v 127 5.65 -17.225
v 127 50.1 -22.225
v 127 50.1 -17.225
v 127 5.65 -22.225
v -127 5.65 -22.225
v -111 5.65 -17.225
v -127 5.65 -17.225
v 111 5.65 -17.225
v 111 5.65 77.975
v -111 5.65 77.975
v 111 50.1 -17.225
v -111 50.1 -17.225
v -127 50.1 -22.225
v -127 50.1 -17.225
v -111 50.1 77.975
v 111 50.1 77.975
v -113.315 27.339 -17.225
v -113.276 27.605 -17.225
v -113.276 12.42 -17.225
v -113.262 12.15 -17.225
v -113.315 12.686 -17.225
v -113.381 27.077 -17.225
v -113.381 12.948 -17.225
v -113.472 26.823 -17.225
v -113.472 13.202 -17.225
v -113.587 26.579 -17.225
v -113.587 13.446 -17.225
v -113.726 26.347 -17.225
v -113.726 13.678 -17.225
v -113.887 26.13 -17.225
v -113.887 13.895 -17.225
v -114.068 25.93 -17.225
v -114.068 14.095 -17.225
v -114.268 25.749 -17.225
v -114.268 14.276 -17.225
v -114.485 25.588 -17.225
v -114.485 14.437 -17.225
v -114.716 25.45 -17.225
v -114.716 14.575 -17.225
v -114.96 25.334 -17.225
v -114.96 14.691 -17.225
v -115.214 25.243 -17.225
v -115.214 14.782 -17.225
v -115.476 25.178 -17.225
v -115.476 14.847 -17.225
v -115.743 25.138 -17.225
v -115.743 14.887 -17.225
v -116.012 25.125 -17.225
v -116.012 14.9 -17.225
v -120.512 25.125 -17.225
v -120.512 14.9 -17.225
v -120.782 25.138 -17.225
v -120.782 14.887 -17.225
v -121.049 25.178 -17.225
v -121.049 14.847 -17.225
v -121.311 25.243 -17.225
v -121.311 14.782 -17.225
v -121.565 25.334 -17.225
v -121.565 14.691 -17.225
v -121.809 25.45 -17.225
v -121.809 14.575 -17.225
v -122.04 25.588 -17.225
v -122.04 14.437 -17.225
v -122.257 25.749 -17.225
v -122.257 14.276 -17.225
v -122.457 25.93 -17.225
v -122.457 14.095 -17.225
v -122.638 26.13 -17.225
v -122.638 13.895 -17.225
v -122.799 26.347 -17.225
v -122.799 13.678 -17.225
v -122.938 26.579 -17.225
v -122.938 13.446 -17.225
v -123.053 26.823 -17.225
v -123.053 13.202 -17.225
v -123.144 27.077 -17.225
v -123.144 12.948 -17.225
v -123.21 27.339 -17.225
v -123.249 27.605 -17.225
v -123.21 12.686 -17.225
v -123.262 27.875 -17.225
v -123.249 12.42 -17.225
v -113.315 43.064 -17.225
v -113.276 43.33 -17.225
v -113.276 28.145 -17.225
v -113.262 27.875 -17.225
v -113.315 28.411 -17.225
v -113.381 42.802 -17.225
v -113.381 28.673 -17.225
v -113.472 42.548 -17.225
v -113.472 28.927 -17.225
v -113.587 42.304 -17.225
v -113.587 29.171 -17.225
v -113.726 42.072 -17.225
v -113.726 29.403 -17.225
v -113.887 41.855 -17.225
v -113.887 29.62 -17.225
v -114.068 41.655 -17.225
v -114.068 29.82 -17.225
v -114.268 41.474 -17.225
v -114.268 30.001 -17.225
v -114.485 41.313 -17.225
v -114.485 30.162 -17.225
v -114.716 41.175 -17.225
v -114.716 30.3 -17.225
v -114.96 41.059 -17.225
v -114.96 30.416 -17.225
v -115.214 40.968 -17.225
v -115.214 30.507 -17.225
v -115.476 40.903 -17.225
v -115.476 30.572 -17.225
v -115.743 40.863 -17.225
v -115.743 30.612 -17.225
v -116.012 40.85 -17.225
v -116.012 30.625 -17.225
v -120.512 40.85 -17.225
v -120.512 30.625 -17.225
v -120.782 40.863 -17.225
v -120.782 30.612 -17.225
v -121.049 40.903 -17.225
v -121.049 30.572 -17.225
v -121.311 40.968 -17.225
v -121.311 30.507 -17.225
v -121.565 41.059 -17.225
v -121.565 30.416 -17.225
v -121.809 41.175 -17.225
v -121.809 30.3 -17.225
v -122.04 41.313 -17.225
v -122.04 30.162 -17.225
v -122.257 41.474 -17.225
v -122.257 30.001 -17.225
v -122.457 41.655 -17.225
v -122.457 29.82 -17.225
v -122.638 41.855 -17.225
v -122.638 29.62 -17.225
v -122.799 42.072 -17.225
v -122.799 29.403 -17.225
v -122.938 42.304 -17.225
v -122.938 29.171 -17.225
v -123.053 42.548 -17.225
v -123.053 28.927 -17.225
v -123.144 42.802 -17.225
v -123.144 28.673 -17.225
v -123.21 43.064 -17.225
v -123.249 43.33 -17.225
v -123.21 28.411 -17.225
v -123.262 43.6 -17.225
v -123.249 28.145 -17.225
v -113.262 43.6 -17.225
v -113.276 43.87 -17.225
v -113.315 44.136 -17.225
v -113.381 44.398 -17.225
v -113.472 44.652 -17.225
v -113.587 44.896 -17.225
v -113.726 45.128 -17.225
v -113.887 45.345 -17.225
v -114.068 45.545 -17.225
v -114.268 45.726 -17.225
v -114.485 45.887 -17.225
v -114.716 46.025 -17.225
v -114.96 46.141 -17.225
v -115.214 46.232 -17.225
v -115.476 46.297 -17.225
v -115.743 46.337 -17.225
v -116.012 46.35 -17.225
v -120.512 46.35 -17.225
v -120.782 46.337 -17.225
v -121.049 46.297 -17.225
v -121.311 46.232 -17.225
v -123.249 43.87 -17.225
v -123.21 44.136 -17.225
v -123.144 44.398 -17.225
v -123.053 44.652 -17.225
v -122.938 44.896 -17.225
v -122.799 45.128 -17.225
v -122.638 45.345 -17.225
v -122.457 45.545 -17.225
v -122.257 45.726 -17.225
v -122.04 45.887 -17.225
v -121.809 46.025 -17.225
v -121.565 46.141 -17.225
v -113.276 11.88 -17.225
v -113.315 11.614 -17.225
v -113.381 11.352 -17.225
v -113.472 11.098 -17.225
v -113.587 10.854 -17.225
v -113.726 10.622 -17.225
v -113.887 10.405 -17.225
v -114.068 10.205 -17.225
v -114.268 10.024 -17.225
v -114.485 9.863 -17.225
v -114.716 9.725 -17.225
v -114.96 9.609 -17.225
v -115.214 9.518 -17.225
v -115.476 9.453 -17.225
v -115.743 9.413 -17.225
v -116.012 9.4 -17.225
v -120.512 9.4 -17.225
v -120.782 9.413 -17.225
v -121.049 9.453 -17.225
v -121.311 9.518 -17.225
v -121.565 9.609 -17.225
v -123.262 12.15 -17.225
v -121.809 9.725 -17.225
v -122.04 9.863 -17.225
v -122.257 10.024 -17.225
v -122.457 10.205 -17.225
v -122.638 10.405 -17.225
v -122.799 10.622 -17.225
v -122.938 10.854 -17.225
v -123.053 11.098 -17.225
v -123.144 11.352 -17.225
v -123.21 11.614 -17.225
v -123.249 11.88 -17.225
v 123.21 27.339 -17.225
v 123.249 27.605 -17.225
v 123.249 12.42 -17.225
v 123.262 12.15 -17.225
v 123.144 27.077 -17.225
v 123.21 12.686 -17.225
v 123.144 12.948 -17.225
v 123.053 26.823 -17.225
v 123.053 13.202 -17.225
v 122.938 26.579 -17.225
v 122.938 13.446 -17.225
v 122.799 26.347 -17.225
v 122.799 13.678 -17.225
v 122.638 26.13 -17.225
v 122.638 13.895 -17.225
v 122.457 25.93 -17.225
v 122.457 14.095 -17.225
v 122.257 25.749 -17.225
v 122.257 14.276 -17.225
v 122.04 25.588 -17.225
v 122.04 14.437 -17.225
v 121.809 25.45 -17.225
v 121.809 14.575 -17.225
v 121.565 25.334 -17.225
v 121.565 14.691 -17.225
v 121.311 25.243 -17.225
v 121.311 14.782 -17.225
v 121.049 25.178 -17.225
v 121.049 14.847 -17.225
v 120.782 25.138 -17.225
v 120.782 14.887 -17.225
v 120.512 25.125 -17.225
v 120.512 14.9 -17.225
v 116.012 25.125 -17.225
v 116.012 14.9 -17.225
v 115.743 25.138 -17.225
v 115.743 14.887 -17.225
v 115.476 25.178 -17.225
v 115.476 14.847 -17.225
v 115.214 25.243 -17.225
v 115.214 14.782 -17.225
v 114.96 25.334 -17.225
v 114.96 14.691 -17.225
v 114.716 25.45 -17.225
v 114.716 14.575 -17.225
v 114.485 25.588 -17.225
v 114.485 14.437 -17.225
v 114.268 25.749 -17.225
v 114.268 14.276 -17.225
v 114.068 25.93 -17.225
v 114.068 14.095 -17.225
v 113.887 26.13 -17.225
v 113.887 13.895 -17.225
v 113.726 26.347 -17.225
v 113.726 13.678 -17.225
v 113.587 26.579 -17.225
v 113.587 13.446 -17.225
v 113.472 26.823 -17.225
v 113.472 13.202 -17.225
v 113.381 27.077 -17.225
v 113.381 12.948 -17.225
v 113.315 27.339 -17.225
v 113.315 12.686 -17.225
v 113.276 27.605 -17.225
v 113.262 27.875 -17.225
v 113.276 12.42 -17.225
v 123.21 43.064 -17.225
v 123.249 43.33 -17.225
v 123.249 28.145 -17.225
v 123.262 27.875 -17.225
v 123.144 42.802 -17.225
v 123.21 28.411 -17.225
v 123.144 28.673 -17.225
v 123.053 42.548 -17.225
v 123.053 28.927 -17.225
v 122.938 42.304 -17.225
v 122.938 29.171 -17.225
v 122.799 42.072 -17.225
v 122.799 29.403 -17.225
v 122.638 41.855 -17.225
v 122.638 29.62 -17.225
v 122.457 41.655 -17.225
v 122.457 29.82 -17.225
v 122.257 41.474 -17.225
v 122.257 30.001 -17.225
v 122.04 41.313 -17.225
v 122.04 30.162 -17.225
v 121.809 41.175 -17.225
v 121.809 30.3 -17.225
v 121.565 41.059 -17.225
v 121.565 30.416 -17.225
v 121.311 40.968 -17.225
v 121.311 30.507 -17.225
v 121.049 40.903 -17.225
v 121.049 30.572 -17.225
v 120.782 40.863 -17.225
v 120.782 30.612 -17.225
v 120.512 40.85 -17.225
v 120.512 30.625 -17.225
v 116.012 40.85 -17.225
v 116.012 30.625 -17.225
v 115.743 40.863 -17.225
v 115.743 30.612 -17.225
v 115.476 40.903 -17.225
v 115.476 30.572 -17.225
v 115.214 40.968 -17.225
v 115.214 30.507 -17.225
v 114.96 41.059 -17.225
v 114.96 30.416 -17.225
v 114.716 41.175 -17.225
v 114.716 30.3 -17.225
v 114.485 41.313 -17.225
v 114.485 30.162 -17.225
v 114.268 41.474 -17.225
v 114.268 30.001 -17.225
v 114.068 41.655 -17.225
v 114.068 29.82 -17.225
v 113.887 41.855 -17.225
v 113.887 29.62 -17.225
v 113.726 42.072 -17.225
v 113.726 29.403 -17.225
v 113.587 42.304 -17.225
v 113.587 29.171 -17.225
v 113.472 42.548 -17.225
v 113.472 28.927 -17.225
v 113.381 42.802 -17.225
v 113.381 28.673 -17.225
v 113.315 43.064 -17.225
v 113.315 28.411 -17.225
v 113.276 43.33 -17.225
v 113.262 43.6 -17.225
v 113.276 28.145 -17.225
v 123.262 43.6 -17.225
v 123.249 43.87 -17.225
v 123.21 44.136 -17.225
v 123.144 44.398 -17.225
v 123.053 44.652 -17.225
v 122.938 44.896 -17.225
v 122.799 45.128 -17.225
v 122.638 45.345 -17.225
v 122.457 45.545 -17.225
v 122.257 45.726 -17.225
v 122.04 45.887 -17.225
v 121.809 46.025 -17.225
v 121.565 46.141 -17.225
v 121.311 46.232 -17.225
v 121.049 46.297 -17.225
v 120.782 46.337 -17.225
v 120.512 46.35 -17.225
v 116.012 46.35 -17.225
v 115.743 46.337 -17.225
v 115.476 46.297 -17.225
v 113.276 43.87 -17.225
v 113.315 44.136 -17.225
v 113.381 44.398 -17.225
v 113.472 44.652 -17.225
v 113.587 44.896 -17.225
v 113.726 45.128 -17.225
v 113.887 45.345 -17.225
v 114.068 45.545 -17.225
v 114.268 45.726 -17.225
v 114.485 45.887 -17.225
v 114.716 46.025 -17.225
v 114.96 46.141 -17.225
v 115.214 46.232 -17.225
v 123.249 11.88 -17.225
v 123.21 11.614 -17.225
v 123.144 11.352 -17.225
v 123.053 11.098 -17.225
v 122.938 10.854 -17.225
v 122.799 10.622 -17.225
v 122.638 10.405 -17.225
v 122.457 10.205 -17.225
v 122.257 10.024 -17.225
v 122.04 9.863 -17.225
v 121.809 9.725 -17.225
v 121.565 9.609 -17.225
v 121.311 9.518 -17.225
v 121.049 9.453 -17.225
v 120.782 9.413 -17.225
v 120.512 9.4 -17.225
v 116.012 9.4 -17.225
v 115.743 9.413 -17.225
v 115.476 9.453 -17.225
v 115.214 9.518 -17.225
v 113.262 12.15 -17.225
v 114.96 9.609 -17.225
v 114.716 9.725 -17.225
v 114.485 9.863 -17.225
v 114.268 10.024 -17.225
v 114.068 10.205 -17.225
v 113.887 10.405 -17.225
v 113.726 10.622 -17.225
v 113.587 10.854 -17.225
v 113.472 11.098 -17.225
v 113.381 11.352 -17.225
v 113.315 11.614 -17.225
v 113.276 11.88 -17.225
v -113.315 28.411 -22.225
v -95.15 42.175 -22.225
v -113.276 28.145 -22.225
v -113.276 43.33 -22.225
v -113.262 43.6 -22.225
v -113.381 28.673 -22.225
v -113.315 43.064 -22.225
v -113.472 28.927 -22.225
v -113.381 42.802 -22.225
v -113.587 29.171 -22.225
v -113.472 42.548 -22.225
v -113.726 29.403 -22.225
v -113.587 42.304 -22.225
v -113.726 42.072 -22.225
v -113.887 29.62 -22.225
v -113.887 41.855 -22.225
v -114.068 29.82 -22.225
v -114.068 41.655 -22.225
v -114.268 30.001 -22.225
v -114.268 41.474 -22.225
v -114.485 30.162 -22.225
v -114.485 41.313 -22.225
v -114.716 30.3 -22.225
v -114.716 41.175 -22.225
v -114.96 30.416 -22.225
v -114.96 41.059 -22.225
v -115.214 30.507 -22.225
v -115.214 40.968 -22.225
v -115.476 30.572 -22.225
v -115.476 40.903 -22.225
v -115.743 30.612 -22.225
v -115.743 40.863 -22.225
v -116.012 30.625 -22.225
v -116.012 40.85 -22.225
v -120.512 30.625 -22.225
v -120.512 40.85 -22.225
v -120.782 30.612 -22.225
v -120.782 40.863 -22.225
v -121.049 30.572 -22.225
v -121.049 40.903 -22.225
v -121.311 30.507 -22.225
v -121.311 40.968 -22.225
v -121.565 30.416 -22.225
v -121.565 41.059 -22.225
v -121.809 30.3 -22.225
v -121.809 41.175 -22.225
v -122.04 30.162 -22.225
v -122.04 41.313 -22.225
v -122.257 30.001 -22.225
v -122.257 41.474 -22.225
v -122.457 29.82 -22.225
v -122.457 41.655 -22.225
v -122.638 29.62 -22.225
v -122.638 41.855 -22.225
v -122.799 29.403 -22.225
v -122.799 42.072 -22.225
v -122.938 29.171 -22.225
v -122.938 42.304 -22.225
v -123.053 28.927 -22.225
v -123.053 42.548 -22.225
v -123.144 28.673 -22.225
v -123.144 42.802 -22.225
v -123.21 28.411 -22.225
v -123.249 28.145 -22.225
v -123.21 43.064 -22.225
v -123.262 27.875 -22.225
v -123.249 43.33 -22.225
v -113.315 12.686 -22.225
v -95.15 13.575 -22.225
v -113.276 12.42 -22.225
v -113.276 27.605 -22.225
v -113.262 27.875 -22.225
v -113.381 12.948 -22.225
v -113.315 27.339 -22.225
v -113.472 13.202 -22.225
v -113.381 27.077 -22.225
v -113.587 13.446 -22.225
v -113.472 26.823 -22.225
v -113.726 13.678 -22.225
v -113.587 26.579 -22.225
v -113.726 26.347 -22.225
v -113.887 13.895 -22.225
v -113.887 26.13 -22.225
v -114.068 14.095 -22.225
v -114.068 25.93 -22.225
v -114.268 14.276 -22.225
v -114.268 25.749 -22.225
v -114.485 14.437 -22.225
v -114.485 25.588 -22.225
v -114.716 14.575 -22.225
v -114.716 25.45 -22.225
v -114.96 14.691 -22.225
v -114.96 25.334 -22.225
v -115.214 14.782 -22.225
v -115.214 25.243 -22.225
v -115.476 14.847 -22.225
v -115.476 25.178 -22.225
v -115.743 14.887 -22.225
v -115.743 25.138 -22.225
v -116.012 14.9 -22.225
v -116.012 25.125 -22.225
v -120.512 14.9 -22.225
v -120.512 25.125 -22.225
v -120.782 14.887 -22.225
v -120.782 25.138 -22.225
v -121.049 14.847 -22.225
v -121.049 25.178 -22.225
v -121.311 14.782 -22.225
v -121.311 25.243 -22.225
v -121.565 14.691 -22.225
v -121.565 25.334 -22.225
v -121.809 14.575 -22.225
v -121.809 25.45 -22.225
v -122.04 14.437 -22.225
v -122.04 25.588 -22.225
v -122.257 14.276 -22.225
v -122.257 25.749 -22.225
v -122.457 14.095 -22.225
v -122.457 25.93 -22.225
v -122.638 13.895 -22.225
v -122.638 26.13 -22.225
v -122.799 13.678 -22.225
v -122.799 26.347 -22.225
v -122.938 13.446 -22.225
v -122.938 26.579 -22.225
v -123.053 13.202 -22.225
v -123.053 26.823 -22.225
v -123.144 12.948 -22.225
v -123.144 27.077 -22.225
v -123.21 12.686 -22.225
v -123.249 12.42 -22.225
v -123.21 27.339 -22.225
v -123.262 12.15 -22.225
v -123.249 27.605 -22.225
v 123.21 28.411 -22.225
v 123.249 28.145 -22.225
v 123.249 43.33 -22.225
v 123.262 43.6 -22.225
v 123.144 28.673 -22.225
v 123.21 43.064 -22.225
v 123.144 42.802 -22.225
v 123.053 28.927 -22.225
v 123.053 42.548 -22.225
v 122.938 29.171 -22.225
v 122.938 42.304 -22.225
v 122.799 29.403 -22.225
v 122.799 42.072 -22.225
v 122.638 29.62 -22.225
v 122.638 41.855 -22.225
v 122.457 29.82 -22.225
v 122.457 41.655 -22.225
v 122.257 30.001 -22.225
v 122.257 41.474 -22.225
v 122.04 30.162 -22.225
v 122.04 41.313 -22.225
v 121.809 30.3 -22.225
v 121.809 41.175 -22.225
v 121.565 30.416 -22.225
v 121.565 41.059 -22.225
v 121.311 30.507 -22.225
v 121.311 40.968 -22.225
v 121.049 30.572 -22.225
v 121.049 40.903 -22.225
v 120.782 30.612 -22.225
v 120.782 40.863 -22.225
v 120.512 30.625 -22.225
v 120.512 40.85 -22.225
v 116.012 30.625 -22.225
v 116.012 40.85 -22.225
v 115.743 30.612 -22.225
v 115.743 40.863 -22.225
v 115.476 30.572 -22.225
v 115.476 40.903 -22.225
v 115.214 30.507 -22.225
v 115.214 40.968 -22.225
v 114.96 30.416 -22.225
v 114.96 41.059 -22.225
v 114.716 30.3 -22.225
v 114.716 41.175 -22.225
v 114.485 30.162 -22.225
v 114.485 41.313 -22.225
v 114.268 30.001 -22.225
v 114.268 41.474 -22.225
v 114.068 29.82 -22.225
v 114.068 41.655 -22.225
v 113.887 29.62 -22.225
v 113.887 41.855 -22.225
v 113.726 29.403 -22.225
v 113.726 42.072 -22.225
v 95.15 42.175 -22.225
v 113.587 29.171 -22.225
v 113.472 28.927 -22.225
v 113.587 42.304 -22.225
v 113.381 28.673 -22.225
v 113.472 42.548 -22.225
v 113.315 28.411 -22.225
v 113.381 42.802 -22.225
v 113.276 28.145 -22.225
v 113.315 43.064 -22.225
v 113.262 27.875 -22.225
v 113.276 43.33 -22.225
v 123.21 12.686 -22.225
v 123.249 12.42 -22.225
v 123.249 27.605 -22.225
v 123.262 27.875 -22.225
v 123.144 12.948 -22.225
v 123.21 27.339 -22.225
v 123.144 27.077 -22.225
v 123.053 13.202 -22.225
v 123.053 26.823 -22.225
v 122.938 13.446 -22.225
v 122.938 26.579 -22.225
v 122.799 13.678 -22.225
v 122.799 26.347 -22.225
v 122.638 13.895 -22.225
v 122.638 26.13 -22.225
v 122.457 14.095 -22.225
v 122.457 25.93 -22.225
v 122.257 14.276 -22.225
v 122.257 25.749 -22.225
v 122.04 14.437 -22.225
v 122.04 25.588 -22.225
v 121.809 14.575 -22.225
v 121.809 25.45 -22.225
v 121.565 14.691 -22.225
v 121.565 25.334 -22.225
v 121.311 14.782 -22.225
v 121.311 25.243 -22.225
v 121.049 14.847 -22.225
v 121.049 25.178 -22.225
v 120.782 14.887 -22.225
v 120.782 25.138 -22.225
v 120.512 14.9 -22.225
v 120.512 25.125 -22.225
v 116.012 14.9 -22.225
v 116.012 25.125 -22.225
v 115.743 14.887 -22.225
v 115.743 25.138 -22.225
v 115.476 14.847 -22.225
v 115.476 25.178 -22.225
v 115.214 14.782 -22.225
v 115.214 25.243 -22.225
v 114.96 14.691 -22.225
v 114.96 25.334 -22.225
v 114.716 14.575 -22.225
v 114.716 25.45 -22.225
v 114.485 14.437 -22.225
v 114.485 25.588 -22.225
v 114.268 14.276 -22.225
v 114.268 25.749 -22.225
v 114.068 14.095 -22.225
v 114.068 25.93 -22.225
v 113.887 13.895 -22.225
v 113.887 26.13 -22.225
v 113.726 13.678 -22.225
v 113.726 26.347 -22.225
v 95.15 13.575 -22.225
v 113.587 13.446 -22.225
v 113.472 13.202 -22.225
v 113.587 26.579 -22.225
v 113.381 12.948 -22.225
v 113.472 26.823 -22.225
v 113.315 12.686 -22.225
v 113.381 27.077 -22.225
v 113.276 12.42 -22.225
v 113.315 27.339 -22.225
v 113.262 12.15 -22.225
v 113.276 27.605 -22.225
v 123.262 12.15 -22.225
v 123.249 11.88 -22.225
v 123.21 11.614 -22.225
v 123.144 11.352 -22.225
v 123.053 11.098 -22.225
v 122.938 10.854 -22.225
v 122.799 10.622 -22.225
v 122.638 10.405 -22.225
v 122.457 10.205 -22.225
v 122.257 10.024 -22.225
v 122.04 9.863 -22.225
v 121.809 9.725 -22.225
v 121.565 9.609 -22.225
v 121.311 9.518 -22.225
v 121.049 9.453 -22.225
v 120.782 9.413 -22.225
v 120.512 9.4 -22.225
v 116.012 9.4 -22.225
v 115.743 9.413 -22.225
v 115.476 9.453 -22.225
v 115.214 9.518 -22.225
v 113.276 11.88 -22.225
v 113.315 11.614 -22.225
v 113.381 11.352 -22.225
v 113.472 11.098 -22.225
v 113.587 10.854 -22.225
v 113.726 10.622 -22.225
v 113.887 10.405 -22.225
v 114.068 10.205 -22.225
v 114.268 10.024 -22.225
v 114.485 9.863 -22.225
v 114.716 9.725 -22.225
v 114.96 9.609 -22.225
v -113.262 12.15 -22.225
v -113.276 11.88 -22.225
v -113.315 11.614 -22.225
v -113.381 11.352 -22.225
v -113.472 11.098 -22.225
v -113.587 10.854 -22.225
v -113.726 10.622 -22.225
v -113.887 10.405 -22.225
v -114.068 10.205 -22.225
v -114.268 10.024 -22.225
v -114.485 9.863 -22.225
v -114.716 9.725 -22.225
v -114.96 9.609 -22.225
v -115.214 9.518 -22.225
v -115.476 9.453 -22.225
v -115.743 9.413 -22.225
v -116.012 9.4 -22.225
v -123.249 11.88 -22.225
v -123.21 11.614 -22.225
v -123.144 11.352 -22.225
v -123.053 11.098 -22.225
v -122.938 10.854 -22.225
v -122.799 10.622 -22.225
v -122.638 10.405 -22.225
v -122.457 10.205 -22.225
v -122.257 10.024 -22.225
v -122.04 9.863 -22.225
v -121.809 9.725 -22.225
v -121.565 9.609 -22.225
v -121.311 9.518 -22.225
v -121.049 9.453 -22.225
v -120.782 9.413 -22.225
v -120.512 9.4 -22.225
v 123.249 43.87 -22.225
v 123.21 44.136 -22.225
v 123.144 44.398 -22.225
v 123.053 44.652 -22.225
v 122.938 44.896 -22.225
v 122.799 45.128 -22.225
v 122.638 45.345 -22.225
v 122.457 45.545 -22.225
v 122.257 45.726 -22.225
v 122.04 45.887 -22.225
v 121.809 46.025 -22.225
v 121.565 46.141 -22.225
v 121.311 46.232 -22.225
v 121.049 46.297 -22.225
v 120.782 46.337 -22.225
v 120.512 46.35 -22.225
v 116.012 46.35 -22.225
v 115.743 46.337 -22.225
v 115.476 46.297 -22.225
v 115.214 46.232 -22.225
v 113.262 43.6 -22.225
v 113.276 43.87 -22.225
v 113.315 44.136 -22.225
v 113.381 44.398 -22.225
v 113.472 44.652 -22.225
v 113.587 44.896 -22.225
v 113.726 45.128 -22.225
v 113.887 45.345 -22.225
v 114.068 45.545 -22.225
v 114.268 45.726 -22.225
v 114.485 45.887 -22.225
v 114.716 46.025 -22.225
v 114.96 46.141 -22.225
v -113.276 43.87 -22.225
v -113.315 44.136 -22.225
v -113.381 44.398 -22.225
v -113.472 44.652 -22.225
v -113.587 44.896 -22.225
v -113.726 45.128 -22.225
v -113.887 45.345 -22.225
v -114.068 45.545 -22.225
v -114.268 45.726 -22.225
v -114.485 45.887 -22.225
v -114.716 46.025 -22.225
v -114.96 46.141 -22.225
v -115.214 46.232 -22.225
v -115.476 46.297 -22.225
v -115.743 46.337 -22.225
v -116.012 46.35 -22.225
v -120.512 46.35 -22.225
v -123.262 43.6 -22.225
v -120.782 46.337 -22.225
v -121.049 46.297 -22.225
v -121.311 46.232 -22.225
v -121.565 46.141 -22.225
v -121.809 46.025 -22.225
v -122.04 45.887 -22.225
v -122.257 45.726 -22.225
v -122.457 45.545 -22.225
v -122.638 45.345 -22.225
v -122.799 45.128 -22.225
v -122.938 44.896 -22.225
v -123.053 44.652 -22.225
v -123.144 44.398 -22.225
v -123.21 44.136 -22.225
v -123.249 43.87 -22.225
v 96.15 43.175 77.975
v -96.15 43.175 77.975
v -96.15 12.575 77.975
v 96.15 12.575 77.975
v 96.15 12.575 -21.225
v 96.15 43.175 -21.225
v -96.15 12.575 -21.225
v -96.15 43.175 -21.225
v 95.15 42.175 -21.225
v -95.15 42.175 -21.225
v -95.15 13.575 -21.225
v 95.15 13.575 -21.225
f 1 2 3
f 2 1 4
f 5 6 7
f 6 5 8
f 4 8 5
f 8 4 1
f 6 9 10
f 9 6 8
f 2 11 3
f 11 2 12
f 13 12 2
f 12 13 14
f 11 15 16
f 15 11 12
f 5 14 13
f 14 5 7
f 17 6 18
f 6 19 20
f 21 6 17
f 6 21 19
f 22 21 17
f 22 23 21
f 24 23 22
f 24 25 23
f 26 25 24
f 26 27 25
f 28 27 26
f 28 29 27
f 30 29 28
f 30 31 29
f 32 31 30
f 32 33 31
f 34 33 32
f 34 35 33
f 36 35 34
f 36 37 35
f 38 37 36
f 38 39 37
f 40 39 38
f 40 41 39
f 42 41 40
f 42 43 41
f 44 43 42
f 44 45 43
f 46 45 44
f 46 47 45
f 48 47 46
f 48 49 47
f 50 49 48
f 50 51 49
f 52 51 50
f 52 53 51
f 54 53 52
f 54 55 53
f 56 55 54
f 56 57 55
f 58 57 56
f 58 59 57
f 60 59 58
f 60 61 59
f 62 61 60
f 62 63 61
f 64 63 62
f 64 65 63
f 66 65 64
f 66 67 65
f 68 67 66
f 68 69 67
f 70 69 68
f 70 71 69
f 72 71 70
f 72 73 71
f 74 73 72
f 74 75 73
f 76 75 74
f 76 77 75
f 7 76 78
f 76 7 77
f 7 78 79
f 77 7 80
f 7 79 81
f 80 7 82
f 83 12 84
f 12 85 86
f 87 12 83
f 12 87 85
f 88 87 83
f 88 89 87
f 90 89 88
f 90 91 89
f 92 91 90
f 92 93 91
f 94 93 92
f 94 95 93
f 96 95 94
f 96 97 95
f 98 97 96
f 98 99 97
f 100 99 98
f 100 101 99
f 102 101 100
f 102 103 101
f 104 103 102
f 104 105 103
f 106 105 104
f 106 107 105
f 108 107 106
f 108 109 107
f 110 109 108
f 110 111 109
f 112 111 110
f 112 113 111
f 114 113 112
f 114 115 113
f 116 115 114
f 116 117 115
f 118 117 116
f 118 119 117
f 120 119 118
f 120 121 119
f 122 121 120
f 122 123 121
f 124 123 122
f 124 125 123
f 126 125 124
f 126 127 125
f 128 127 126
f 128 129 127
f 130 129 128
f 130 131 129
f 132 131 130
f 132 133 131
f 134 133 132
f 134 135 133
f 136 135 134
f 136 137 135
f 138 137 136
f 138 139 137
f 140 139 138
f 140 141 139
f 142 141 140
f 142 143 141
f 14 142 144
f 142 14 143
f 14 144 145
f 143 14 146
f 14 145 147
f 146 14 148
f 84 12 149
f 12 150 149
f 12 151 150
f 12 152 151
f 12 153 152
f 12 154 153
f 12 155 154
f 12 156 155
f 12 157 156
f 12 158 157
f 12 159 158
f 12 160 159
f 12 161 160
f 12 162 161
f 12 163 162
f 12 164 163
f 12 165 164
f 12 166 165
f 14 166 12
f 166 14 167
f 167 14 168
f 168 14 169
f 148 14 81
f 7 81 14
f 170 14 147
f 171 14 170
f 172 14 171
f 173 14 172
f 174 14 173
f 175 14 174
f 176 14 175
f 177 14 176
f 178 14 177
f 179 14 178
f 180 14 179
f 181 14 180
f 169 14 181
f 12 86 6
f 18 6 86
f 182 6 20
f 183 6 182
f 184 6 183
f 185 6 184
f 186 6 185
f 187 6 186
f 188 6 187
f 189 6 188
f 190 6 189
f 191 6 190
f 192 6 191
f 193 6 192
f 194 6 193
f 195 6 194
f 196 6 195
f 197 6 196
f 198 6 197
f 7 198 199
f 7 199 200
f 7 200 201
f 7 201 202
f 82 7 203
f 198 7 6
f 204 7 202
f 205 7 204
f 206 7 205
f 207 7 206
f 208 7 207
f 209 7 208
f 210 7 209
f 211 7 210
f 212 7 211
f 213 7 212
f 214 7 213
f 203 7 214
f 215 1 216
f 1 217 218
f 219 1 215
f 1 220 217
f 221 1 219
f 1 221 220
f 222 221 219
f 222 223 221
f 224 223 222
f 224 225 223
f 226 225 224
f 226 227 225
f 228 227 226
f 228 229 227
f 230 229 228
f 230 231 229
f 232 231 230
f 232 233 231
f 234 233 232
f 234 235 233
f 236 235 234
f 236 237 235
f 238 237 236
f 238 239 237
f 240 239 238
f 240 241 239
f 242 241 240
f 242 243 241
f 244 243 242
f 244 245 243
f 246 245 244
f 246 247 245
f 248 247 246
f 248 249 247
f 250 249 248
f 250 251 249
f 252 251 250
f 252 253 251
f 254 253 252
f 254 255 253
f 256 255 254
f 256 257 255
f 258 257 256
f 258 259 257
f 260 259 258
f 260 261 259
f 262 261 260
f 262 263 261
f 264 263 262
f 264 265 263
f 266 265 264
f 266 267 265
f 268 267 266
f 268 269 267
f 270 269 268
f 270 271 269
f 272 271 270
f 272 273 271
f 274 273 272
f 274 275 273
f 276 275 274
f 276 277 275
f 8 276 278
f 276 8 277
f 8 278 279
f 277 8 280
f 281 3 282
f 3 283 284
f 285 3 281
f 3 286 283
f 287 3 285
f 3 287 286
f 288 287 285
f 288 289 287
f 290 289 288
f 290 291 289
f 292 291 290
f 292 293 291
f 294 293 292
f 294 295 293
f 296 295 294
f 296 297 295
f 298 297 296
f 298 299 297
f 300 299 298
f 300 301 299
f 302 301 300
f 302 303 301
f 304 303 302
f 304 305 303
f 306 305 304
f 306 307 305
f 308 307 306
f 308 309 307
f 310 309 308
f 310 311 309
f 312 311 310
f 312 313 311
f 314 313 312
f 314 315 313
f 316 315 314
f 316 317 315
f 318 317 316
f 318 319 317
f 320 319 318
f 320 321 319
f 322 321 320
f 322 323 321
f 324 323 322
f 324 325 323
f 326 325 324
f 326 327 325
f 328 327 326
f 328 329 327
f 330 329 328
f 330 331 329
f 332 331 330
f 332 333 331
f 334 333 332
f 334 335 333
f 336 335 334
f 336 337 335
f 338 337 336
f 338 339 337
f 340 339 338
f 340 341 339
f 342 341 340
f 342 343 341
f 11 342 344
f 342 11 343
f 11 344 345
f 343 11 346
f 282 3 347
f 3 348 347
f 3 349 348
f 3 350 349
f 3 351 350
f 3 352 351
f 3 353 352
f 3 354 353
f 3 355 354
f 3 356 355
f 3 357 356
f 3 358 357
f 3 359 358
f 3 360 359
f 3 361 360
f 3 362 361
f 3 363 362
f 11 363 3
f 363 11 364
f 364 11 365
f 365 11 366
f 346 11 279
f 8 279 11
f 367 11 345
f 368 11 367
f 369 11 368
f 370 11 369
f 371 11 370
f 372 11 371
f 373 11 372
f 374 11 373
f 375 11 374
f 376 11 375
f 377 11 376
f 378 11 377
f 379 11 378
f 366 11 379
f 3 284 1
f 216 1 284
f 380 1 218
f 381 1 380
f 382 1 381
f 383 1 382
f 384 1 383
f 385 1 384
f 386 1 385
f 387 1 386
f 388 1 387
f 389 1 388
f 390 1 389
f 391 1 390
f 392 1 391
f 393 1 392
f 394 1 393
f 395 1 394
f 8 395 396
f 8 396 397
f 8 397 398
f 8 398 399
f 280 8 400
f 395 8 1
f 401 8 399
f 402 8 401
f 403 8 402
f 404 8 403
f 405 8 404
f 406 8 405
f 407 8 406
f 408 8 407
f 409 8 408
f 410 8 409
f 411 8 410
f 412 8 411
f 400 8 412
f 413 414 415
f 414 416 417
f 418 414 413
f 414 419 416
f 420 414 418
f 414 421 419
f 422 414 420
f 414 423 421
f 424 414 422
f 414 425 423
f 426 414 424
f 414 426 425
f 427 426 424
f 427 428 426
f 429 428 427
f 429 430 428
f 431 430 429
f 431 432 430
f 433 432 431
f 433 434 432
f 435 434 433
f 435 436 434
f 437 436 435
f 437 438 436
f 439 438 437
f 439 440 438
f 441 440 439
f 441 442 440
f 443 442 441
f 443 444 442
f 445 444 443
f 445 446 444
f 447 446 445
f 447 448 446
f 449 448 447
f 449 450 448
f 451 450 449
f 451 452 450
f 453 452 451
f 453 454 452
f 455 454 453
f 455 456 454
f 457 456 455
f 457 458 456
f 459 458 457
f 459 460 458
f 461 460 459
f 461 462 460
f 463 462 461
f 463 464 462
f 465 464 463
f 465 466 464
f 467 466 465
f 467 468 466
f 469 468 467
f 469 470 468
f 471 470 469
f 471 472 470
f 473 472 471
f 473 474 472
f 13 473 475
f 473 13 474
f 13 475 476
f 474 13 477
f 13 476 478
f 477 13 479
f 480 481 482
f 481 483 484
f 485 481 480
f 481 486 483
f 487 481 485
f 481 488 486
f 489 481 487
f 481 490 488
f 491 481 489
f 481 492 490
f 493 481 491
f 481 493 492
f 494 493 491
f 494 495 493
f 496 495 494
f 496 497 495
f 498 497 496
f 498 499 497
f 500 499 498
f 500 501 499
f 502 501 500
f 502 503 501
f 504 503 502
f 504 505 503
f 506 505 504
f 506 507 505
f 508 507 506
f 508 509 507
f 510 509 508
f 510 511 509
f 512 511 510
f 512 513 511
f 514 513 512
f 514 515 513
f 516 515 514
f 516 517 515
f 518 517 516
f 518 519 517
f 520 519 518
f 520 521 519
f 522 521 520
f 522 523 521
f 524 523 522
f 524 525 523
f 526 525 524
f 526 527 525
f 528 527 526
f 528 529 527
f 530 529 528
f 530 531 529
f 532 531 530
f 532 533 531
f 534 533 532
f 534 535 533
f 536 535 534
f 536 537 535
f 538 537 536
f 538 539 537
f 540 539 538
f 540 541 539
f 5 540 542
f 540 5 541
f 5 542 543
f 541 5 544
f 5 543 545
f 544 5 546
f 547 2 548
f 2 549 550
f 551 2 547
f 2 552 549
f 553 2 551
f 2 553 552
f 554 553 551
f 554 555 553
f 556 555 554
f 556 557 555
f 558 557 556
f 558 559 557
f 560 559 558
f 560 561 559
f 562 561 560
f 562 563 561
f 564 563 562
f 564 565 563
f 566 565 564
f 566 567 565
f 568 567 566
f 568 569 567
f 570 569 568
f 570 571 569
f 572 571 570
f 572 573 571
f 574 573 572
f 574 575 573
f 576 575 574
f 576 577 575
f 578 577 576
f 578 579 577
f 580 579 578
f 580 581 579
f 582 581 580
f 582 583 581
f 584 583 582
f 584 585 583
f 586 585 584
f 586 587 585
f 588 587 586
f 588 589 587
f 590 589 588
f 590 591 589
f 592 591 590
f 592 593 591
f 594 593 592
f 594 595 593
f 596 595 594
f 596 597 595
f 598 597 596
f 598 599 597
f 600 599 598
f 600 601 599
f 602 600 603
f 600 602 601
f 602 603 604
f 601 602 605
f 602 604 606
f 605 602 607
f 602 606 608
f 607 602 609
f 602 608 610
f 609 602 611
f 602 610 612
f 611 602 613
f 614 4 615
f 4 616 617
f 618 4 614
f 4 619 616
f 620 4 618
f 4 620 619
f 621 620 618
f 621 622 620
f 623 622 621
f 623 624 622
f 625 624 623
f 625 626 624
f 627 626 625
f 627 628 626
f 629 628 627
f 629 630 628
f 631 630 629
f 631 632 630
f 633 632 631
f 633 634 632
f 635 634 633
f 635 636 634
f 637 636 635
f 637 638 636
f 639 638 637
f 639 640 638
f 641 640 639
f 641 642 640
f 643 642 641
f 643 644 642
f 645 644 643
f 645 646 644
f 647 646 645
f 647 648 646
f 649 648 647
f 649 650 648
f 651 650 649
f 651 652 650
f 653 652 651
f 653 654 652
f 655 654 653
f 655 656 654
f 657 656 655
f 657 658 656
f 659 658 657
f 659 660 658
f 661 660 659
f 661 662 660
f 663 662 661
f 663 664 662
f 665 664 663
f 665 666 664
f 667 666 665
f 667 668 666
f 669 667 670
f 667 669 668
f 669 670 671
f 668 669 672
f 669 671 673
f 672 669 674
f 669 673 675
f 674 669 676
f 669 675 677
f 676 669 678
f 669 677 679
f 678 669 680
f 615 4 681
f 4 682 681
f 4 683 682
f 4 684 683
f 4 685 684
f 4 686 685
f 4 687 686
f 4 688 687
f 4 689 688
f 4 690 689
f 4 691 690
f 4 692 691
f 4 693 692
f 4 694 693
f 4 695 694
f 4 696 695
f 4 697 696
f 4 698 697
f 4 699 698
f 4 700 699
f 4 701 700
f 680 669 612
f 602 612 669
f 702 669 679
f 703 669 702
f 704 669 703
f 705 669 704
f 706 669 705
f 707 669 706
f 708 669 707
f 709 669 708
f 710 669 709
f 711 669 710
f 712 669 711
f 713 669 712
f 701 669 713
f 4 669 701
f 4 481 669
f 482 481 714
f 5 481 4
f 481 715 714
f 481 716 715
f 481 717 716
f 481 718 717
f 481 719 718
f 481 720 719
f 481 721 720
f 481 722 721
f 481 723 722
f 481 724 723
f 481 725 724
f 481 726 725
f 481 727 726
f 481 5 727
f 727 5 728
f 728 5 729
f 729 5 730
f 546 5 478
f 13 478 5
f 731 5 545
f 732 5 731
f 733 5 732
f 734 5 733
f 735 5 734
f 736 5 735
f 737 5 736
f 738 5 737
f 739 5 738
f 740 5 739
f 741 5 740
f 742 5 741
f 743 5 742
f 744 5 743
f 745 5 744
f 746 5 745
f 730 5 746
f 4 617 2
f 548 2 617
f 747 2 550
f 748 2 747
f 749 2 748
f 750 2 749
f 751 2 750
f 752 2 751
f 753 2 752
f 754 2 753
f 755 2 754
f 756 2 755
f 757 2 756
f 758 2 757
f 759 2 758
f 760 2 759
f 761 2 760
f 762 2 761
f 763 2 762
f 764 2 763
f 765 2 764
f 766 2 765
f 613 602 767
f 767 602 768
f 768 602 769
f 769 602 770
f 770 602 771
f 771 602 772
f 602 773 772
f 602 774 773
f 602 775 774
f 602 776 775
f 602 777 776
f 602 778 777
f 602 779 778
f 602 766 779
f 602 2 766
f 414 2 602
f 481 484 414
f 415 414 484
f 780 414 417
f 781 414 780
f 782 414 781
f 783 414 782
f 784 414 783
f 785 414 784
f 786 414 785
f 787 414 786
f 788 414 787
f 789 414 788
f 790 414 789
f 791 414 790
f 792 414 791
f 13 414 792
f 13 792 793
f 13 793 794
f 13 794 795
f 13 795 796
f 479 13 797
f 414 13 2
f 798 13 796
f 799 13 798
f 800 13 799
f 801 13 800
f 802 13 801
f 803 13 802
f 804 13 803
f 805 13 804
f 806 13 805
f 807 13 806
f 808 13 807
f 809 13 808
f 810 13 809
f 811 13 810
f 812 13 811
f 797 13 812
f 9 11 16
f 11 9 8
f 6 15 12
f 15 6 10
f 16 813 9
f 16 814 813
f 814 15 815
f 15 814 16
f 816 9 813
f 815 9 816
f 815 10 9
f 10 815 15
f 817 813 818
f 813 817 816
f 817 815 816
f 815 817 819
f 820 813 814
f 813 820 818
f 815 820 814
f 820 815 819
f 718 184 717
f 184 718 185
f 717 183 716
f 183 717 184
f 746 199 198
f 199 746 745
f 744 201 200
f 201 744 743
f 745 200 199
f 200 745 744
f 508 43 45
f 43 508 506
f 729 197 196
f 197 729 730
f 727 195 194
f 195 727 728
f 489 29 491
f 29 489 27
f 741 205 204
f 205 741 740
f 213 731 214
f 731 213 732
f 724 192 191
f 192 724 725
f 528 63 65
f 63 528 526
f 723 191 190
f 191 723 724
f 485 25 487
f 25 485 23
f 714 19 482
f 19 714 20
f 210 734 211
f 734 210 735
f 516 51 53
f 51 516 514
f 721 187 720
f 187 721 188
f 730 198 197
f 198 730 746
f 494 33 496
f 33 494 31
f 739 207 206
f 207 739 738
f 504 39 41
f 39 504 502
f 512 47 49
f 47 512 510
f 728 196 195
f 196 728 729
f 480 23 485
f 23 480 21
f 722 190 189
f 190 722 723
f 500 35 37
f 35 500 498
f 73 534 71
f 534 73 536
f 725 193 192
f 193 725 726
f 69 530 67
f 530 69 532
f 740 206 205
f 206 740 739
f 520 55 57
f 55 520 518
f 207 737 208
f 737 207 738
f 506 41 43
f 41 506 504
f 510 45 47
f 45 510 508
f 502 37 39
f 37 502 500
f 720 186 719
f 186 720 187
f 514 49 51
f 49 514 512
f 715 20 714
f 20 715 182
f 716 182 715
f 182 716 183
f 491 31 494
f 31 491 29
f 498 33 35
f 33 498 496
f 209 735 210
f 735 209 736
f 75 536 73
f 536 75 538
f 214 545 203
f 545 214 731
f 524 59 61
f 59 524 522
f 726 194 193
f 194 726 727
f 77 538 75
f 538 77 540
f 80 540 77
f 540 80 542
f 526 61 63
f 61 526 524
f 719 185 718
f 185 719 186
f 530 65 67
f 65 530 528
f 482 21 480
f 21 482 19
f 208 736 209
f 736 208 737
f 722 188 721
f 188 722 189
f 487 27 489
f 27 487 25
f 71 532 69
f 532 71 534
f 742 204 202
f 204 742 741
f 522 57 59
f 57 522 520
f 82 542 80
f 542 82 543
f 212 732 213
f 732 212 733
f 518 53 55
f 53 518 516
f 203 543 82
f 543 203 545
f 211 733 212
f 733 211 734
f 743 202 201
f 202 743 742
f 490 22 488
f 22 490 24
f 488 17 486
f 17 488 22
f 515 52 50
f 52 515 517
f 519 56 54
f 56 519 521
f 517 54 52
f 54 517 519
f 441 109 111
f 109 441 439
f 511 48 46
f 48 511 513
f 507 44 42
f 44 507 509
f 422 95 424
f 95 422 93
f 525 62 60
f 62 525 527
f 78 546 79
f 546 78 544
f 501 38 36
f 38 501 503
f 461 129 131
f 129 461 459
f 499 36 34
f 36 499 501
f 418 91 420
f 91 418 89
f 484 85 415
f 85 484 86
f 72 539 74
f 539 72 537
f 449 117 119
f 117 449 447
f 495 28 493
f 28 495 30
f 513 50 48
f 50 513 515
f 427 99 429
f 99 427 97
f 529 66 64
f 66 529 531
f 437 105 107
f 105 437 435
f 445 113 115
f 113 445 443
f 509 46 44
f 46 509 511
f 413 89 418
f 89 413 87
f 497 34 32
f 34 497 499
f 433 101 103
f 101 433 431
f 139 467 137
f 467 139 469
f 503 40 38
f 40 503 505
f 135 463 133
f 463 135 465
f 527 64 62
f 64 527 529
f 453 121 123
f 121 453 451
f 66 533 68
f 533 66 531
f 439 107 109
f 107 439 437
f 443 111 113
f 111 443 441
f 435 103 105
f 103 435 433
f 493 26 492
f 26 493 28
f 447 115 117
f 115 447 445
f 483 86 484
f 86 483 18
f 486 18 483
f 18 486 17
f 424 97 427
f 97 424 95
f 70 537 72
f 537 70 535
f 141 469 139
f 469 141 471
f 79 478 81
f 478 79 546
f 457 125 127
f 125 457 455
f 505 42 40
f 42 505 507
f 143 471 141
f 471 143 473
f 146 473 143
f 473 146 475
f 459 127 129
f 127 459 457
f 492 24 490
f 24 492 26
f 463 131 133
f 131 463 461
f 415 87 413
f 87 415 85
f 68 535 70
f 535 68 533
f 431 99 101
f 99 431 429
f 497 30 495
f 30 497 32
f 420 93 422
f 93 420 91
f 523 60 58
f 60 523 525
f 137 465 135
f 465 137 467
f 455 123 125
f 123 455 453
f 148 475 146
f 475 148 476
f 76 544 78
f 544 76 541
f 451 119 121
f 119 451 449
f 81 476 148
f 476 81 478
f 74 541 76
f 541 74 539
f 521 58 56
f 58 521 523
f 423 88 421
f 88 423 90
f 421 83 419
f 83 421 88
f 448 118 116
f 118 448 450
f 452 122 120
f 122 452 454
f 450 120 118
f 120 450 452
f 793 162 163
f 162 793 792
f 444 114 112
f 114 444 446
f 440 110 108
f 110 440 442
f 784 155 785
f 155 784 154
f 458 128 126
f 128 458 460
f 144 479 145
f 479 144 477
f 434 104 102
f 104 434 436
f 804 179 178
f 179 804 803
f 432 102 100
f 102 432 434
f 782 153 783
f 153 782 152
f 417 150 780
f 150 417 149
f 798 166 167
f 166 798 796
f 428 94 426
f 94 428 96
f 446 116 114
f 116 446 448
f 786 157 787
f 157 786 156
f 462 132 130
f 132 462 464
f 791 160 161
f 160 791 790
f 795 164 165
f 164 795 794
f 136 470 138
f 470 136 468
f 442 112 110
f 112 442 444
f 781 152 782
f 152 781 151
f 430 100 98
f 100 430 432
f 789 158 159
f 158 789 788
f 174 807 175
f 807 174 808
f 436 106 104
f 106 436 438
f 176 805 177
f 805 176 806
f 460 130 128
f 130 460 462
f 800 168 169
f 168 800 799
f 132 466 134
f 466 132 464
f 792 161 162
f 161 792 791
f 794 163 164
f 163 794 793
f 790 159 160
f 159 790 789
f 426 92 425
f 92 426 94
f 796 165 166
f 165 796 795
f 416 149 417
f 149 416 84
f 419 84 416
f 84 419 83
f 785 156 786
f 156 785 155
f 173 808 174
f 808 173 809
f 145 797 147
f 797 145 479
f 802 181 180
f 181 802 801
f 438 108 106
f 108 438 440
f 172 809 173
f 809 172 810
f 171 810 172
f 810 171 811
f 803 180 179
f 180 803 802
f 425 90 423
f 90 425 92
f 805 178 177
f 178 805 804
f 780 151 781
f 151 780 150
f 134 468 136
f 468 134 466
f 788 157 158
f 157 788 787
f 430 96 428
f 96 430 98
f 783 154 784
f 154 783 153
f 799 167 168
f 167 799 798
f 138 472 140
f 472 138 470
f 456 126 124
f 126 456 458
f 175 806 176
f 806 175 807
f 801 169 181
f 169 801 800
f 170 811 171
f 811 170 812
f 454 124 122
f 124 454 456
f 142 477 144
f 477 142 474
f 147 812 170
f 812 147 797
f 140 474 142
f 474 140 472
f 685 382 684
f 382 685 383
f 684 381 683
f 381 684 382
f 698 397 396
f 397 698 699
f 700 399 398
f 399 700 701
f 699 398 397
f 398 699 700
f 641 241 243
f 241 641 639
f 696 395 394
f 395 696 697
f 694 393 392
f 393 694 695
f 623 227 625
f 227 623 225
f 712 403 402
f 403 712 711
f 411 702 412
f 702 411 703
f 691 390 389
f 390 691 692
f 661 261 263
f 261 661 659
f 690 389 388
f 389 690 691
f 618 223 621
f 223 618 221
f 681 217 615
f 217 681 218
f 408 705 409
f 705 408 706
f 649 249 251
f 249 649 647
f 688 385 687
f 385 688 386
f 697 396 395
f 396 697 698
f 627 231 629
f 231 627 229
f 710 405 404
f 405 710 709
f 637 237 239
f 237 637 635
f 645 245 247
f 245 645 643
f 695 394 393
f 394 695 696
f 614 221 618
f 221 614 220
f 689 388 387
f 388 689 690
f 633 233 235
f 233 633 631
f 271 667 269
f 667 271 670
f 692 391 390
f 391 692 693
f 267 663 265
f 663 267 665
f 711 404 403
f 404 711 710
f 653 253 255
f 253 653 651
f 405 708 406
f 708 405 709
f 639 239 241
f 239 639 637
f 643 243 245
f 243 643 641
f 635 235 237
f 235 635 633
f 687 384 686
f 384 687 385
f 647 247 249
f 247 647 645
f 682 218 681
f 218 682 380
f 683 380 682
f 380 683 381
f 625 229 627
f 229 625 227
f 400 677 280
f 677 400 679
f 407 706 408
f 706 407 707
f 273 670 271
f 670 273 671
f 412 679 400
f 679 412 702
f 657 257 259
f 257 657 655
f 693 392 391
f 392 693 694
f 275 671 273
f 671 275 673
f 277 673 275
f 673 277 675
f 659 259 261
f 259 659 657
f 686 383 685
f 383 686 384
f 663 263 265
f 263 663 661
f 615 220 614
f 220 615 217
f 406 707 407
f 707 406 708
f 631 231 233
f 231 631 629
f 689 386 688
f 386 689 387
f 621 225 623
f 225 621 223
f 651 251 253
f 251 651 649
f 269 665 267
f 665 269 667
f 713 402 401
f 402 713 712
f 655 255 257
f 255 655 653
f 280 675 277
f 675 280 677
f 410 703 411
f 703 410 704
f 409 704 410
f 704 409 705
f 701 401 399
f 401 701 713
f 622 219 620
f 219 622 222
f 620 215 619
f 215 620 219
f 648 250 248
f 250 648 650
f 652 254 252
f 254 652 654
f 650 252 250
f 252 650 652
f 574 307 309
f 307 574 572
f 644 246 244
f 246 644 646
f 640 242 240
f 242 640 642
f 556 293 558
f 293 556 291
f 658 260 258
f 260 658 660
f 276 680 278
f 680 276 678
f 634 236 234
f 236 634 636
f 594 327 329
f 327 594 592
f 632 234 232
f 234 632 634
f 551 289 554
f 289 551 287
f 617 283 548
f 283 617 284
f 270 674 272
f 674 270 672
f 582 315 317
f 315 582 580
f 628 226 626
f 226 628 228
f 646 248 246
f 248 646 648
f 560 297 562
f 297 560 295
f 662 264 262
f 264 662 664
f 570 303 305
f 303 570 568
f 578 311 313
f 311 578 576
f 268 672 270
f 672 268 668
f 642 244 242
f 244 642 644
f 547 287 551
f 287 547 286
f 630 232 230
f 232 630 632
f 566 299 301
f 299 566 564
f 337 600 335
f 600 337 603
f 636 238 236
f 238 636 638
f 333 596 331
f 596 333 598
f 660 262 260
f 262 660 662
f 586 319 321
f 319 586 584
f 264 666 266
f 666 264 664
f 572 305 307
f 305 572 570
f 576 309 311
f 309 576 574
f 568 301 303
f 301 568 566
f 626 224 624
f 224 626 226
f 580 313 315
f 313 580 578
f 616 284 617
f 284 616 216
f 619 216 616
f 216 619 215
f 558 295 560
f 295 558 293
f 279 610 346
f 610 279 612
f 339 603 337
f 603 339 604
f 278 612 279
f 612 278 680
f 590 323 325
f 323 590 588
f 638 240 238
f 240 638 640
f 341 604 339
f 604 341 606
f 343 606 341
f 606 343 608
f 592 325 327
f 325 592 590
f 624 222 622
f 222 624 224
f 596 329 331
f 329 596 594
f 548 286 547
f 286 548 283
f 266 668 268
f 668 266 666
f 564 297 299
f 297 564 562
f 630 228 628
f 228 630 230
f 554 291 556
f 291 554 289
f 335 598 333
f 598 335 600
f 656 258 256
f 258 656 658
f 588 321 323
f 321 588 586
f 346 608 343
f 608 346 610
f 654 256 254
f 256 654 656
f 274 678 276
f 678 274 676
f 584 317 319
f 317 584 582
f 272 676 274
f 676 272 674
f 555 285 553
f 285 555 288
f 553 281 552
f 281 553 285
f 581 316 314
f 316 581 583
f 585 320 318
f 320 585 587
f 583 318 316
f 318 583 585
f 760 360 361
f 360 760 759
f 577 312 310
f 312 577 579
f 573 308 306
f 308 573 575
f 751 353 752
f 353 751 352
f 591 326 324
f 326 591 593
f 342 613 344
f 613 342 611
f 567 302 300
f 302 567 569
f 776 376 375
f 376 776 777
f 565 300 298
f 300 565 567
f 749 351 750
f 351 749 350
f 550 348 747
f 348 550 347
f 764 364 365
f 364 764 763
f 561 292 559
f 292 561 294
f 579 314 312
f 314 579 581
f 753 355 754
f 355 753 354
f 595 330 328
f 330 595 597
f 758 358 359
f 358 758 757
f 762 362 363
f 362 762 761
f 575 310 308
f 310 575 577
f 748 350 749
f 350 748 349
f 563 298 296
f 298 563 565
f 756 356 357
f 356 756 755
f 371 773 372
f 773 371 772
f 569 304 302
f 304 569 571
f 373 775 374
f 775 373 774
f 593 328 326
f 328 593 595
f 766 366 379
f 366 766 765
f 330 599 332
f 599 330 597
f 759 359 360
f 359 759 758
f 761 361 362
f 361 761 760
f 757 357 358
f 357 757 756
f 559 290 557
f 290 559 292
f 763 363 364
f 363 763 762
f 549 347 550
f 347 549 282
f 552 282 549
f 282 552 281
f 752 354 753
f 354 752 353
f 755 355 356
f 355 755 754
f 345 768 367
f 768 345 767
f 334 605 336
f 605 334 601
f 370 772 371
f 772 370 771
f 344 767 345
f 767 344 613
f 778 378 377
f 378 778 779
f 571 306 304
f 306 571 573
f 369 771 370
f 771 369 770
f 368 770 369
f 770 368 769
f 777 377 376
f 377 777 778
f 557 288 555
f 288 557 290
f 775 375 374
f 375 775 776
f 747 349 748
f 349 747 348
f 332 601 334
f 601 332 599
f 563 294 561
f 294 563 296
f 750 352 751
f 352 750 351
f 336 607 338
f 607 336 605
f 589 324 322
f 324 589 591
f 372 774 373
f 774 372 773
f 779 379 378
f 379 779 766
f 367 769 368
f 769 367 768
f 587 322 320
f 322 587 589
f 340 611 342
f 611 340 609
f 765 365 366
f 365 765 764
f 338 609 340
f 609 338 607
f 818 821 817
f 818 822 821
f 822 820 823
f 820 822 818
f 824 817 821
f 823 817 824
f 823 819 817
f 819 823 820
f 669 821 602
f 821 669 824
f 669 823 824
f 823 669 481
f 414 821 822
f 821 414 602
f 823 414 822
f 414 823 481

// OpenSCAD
// Only these parameters will be visible to the user
switch_width = 190.0;
switch_height = 28.30;
depth = 100.20;
// ---
// Global variables for external transformations
front_width = 254.0;
height = 44.45; // 1U
// ---

// The main module containing all internal variables
module switch_mount(switch_width, switch_height, depth) {

    // Internal Variables (not visible to user)
    chassis_width = 222.0;
    front_thickness = 5.0;
    tolerance = 0.15;
    cutout_gap = 2.0 + 2 * tolerance;
    lip_thickness = 1.0;
    lip_depth = 1.0;
    side_margin = (front_width - chassis_width) / 2;
    slot_len = 10.0;
    slot_height = 5.5;
    hole_top_z = height - 6.5;
    hole_center_z = height / 2;
    hole_bottom_z = 6.5;
    hole_spacing_x = 236.525;
    hole_left_x = (front_width - hole_spacing_x) / 2;
    hole_right_x = (front_width + hole_spacing_x) / 2;
    $fn = 64;

    // Internal Calculations (using the user parameters)
    cutout_w = switch_width + cutout_gap;
    cutout_h = switch_height + cutout_gap;
    cutout_x = (front_width - cutout_w) / 2;
    cutout_z = (height - cutout_h) / 2;

    // Helper functions and geometry
    module capsule_slot_2d(L, H) {
        union() {
            translate([-(L-H)/2, -H/2]) square([L-H, H], center=false);
            translate([-L/2 + H/2, 0]) circle(r=H/2);
            translate([L/2 - H/2, 0]) circle(r=H/2);
        }
    }

    module rack_hole(x_pos, z_pos) {
        translate([x_pos, 0, z_pos]) {
            rotate([90, 0, 0]) {
                linear_extrude(height = front_thickness * 2, center = true) {
                    capsule_slot_2d(slot_len, slot_height);
                }
            }
        }
    }

    // Model generation logic
    union() {
        difference() {
            union() {
                // Front plate
                cube([front_width, front_thickness, height], center = false);
                // Chassis
                translate([side_margin, front_thickness, 0])
                    cube([chassis_width, depth - front_thickness, height], center = false);
            }
            // Full switch cutout
            translate([cutout_x, 0, cutout_z])
                cube([cutout_w, depth, cutout_h], center = false);

            // Rack mount holes
            rack_hole(hole_left_x, hole_top_z);
            rack_hole(hole_left_x, hole_center_z);
            rack_hole(hole_left_x, hole_bottom_z);
            rack_hole(hole_right_x, hole_top_z);
            rack_hole(hole_right_x, hole_center_z);
            rack_hole(hole_right_x, hole_bottom_z);
        }

        // Hollow lip frame
        difference() {
            translate([cutout_x, 0, cutout_z])
                cube([cutout_w, lip_depth, cutout_h], center = false);
            translate([cutout_x + lip_thickness, 0, cutout_z + lip_thickness])
                cube([cutout_w - 2 * lip_thickness, lip_depth, cutout_h - 2 * lip_thickness], center = false);
        }
    }
}

// Rotate and then translate the entire model for centering and 3D printing.
// These variables are now accessible here
rotate([90, 0, 0]) {
    translate([-front_width/2, -height/2, -depth/2]) {
        switch_mount(switch_width, switch_height, depth);
    }
}
